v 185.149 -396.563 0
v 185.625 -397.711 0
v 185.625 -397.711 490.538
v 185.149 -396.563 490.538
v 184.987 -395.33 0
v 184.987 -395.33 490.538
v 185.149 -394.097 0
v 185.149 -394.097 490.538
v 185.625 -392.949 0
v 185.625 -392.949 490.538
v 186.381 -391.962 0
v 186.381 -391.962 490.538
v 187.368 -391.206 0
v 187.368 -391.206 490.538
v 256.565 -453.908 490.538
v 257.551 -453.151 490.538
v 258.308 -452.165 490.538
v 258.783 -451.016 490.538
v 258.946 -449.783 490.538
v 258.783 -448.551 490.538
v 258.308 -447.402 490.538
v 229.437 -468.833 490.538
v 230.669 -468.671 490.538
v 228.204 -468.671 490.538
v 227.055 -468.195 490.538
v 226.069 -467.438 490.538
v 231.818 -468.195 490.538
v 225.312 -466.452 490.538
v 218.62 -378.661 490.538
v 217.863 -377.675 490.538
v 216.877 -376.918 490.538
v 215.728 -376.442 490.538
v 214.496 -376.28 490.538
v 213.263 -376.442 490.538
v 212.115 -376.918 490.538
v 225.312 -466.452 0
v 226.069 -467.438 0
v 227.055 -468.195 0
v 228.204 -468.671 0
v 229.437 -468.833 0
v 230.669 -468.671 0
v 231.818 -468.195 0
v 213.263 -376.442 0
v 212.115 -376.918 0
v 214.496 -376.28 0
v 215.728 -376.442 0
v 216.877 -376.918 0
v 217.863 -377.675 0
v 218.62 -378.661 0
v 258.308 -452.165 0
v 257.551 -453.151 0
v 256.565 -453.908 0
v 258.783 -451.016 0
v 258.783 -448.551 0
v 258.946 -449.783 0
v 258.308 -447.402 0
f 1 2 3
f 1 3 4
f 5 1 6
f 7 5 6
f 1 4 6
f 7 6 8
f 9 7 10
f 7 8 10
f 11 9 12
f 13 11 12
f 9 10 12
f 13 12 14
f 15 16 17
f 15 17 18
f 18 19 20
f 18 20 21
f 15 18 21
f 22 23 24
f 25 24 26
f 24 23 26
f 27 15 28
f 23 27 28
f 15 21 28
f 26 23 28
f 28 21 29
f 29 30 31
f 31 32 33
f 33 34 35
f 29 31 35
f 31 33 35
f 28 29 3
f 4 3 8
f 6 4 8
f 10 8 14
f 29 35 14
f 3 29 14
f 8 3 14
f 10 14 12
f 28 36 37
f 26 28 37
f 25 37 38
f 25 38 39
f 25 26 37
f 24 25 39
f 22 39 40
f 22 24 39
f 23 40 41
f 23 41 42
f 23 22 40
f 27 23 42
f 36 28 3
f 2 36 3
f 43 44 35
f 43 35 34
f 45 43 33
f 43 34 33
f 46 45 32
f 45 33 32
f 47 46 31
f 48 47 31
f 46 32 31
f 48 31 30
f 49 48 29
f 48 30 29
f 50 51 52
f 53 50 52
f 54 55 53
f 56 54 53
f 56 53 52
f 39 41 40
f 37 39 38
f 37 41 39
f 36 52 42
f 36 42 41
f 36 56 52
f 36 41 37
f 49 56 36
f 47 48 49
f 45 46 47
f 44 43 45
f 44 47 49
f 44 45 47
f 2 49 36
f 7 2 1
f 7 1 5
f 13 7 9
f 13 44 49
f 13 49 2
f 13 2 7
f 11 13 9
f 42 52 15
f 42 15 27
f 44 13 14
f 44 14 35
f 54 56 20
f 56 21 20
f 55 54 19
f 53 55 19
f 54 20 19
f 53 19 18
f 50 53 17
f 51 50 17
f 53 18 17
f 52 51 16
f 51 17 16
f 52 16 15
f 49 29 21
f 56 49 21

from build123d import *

# Parameters (mm, degrees)
BOSS_EXTRUDE1_DEPTH = 490.537961
FILLET1_R           = 4.7625


with BuildPart() as part:
    # Sketch1 → Boss-Extrude1 (new body)
    with BuildSketch(Plane.XY):
        Polygon((227.693380197, -470.576503047), (183.243380197, -393.586844651), (216.238948081, -374.536844651), (260.688948081, -451.526503047), align=None)
    extrude(amount=BOSS_EXTRUDE1_DEPTH)

    # Fillet1
    fillet1_edges = [part.edges().sort_by_distance(p)[0] for p in [
        (227.693380197, -470.576503047, 245.2689805),
        (183.243380197, -393.586844651, 245.2689805),
        (216.238948081, -374.536844651, 245.2689805),
        (260.688948081, -451.526503047, 245.2689805),
    ]]
    fillet(fillet1_edges, radius=FILLET1_R)


solid = part.part
